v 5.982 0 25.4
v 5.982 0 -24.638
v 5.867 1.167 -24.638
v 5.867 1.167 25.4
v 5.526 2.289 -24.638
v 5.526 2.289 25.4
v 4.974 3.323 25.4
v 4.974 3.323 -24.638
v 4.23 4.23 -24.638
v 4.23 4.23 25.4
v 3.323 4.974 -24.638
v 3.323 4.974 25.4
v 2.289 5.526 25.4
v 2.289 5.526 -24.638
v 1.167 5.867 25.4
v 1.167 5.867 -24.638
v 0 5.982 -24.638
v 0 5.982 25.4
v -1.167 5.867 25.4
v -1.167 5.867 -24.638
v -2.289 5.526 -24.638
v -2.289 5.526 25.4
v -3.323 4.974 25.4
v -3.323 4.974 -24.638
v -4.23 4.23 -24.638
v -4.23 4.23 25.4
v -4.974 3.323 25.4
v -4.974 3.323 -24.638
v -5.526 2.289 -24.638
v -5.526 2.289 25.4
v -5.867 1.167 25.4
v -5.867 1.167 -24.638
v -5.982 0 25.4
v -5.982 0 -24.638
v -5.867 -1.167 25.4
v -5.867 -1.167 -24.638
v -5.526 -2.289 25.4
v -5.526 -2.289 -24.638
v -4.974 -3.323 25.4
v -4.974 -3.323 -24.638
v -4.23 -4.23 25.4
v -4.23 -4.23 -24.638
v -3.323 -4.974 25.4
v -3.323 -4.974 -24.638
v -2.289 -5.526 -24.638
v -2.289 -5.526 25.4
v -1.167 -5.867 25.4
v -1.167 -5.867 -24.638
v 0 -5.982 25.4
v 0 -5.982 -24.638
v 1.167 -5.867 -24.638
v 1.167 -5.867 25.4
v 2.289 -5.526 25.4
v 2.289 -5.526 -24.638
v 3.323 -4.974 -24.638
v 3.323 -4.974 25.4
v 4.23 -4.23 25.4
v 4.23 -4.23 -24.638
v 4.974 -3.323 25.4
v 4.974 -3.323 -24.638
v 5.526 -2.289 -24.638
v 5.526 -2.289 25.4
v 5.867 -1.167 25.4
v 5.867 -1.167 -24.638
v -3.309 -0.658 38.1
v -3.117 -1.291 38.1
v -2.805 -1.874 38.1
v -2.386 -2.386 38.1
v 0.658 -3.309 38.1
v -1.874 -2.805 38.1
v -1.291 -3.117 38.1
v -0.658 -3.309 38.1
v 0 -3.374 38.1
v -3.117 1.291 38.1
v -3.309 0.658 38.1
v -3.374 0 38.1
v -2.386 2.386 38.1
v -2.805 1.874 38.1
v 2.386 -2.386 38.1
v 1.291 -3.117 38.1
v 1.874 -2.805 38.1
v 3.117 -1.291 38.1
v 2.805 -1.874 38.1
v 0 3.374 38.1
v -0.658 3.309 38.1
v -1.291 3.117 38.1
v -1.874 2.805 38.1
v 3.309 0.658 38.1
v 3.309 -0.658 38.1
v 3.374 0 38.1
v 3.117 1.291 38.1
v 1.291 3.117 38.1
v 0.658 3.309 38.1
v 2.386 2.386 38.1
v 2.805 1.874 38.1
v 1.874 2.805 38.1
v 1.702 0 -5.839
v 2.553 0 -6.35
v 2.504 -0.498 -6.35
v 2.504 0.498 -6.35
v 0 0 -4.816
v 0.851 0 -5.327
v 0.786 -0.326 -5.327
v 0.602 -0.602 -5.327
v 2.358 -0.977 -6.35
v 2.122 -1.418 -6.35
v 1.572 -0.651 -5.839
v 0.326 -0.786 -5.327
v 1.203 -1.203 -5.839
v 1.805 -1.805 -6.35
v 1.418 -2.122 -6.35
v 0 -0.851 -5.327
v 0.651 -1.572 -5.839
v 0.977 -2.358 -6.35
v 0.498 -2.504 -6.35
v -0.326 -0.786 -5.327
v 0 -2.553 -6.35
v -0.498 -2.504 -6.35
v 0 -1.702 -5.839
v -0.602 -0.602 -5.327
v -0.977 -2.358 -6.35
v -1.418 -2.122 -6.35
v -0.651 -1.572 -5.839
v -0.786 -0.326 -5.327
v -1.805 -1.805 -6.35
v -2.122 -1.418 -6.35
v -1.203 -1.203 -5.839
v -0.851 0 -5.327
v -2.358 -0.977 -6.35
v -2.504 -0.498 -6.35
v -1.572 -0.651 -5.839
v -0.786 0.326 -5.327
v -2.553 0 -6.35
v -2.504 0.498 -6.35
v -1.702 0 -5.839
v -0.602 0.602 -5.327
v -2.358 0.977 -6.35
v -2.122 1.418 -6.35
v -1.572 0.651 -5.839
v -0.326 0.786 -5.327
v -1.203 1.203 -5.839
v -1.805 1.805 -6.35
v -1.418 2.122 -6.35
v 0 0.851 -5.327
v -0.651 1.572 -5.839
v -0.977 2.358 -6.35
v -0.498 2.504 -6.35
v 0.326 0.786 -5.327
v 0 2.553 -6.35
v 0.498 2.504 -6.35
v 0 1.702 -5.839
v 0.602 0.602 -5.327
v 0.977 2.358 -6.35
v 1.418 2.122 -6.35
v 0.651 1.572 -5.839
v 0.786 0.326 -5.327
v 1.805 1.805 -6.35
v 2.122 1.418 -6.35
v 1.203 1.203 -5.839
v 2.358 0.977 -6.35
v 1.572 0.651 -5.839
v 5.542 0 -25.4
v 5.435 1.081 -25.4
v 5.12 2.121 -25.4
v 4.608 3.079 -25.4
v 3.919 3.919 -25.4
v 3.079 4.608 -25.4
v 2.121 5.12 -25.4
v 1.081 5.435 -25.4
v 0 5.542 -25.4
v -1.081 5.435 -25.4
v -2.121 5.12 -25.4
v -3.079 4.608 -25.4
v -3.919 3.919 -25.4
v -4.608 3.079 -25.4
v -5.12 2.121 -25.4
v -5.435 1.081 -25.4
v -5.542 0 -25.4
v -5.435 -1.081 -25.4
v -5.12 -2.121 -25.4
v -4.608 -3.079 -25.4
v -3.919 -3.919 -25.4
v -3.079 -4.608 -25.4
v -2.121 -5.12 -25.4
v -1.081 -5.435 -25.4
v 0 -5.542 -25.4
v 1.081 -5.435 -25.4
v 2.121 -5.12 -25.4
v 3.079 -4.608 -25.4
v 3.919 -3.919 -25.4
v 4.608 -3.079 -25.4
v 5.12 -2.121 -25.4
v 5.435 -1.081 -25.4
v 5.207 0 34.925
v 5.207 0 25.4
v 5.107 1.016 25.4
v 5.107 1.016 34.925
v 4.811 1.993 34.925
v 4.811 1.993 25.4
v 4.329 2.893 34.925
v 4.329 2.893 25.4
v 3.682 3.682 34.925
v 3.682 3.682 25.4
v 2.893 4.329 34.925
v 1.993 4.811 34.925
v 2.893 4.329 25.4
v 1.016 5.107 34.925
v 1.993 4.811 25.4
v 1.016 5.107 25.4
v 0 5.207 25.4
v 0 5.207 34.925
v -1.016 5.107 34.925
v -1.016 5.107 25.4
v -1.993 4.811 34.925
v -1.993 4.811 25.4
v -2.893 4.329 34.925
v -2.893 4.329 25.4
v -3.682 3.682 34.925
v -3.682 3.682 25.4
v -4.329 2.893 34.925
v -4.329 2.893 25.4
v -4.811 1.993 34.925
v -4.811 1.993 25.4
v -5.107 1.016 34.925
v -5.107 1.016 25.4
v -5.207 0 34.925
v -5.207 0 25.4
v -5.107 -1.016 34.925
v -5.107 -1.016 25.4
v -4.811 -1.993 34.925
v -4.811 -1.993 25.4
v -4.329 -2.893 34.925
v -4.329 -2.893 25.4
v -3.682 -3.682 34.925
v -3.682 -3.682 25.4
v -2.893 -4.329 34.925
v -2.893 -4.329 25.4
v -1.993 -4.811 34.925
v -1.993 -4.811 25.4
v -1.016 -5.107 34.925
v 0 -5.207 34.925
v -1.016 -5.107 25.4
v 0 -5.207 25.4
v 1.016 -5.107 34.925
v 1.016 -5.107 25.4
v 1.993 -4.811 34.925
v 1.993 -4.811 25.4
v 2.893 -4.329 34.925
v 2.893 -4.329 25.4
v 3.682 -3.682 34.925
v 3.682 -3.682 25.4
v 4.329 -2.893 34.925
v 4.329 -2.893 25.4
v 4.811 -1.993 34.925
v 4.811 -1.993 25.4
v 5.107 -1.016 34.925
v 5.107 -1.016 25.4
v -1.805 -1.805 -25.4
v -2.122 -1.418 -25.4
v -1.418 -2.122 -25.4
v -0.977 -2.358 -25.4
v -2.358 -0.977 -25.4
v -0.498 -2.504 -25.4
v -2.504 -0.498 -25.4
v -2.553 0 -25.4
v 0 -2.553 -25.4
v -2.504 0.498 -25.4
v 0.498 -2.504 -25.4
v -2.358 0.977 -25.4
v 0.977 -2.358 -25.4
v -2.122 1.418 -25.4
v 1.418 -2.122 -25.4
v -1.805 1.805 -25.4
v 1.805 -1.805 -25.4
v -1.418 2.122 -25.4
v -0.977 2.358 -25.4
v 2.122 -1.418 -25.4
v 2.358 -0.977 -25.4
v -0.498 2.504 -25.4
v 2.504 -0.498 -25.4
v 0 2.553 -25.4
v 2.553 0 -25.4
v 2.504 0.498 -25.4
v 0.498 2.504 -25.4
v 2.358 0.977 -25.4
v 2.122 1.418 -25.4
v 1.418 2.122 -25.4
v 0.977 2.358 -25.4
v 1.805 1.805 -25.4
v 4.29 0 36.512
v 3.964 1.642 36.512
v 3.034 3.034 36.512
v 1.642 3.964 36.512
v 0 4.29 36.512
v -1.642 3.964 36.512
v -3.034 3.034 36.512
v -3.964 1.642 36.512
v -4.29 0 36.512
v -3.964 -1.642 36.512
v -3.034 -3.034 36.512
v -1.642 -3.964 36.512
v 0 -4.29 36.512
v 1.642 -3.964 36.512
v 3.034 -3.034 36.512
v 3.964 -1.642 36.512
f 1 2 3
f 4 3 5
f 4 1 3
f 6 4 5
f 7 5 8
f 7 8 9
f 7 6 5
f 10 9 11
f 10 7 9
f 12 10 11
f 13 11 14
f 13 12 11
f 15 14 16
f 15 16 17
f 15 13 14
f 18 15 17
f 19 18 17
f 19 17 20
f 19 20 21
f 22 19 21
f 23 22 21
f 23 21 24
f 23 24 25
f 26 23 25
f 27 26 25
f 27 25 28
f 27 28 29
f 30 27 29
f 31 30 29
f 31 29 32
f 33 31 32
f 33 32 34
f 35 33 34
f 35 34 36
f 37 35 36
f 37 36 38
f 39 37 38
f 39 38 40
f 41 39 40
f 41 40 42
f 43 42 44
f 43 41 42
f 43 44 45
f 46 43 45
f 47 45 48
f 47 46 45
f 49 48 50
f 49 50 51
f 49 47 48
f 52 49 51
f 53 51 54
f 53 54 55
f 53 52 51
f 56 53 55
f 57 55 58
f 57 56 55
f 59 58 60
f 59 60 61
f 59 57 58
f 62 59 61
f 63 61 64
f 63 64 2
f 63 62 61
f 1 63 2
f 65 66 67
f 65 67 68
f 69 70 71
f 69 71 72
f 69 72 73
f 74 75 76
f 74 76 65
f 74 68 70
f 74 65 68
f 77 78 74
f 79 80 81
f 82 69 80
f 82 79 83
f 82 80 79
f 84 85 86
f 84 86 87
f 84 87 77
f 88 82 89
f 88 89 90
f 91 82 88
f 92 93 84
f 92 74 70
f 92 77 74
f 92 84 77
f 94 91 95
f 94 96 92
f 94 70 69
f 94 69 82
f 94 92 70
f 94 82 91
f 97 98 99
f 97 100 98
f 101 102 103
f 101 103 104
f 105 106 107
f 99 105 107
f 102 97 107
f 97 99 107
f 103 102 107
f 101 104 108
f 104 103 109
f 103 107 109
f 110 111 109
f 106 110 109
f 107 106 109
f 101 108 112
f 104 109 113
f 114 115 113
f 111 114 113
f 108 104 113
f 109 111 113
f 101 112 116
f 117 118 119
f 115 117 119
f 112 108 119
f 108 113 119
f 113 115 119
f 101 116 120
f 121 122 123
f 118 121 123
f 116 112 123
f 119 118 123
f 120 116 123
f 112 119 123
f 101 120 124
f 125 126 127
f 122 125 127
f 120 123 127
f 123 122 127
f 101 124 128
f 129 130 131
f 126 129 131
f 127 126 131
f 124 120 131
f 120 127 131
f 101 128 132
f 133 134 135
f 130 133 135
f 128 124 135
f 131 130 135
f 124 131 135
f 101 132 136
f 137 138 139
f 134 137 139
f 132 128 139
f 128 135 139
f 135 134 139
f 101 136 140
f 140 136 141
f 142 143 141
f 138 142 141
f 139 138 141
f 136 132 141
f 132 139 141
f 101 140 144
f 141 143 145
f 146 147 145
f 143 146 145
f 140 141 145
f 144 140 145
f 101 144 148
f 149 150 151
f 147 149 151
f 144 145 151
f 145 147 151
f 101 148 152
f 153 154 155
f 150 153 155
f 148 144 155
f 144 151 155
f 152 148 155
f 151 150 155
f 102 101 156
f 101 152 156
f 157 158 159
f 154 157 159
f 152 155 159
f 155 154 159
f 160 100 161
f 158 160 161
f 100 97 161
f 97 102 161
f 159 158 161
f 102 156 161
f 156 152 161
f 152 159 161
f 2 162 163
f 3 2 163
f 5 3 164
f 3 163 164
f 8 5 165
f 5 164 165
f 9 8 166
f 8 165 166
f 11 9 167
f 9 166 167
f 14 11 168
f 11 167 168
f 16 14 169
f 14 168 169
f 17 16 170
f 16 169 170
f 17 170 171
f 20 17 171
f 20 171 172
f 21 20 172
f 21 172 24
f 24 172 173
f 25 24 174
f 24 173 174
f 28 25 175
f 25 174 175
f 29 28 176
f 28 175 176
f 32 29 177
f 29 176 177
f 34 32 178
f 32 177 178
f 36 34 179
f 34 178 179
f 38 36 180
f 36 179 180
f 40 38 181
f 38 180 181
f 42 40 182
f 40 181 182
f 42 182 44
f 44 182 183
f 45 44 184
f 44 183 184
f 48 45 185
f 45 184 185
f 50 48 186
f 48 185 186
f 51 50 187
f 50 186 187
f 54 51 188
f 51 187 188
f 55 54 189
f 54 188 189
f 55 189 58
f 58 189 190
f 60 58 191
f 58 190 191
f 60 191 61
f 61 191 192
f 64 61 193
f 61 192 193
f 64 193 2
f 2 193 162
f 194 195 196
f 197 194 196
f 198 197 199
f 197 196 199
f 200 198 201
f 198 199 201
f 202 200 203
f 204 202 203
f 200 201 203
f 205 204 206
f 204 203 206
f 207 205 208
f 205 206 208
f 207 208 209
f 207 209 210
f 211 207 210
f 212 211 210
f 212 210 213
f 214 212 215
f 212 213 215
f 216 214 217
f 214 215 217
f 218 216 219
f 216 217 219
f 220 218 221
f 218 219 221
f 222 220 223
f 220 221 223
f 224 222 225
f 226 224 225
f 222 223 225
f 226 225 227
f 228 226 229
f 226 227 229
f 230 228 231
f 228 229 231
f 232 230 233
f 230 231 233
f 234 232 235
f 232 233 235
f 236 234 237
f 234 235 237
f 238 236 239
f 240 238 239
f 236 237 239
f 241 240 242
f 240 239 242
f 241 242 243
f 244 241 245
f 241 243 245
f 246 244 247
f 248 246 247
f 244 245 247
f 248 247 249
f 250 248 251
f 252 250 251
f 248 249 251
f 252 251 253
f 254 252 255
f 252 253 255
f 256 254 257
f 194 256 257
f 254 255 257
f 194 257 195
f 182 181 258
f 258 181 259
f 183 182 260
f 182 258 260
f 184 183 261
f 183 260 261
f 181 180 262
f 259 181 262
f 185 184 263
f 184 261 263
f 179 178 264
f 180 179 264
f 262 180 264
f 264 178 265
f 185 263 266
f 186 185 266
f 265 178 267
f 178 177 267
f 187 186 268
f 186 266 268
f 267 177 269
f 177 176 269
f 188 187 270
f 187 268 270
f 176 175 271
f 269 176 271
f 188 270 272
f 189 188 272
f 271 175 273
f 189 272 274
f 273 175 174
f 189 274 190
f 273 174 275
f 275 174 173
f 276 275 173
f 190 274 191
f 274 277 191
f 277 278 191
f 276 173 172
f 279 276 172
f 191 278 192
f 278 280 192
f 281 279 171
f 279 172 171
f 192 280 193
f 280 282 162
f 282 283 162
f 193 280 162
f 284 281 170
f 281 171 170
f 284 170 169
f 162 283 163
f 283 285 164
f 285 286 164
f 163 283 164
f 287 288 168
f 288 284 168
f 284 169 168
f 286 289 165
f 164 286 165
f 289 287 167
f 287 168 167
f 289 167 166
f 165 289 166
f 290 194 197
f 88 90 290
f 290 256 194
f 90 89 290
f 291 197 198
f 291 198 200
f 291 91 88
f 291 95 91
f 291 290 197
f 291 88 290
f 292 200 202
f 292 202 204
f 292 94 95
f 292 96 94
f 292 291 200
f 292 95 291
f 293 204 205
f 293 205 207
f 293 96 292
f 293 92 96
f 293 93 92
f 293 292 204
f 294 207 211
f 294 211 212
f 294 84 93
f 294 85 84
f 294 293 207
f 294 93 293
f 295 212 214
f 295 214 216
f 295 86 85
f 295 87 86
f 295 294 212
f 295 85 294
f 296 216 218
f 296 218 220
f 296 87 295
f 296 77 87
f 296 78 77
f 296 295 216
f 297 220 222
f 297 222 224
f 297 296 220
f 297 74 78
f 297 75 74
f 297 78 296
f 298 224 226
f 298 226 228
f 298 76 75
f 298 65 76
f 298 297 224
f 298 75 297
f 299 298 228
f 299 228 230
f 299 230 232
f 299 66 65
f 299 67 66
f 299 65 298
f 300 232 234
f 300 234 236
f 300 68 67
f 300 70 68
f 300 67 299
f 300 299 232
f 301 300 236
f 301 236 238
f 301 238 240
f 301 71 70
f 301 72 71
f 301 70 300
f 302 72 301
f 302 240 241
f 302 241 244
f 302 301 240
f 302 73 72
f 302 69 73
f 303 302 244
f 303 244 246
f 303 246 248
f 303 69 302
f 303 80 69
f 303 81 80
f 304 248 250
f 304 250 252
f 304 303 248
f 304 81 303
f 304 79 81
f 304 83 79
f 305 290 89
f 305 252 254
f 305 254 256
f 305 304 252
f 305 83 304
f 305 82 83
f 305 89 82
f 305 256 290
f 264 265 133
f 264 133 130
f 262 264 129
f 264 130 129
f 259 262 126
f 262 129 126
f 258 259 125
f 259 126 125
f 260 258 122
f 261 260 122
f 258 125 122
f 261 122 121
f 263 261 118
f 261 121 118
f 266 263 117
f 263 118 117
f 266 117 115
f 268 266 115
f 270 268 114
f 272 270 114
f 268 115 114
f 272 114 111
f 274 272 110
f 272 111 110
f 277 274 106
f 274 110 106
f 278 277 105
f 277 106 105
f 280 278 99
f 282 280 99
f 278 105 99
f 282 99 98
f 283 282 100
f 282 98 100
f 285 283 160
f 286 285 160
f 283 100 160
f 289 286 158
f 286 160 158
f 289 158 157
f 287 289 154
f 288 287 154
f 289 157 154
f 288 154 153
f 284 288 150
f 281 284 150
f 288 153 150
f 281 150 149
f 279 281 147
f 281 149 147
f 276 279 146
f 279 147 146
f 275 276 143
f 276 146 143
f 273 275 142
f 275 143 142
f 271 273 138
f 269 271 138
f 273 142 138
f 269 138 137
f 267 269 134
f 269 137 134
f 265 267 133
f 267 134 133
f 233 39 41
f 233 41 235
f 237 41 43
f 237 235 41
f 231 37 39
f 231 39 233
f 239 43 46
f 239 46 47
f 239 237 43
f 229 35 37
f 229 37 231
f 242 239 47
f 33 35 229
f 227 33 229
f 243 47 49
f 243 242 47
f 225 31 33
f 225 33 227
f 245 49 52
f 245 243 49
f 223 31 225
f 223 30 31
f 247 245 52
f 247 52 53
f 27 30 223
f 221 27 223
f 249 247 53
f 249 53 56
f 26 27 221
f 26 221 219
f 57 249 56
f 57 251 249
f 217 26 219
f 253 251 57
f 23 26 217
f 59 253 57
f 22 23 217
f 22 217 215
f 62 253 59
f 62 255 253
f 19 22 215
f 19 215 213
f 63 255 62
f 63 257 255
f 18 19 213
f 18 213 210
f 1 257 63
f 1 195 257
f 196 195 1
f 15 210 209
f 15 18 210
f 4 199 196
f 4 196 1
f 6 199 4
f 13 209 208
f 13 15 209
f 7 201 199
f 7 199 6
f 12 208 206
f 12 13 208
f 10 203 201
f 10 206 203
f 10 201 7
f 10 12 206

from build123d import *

# Parameters (mm, degrees)
F0_R     = 5.9817
F1_DEPTH = 25.4
F2_R     = 5.207
F3_DEPTH = 12.7
F4_SIZE2 = 1.8330871047
F4_SIZE  = 3.175
F5_SIZE2 = 0.4399409051
F5_SIZE  = 0.762
F7_D     = 5.1054
F7_DEPTH = 19.05
F7_TIP   = 1.5338169022


with BuildPart() as f1:
    # F0 (on Top) → F1 (new body, symmetric)
    with BuildSketch(Plane.XY):
        Circle(F0_R)
    extrude(amount=F1_DEPTH, both=True)

    # F2 (on face) → F3 (join)
    with BuildSketch(Plane.XY.offset(25.4)):
        Circle(F2_R)
    extrude(amount=F3_DEPTH)

    # F4
    f4_edges = [f1.edges().sort_by_distance(p)[0] for p in [
        (-5.207, 0, 38.1),
    ]]
    f4_side = f1.faces().sort_by_distance((-5.207, 0, 31.75))[0]
    chamfer(f4_edges, length=F4_SIZE, length2=F4_SIZE2, reference=f4_side)

    # F5
    f5_edges = [f1.edges().sort_by_distance(p)[0] for p in [
        (-5.9817, 0, -25.4),
    ]]
    f5_side = f1.faces().sort_by_distance((-5.9817, 0, 0))[0]
    chamfer(f5_edges, length=F5_SIZE, length2=F5_SIZE2, reference=f5_side)

    # F7
    with Locations(Plane(origin=(0, 0, -25.4), x_dir=(1, 0, 0), z_dir=(0, 0, -1))):
        with Locations((0, 0)):
            Hole(F7_D / 2, depth=F7_DEPTH)
            with Locations((0, 0, -(F7_DEPTH + F7_TIP / 2))):  # 118° drill point
                Cone(0, F7_D / 2, F7_TIP, mode=Mode.SUBTRACT)


solid = f1.part
